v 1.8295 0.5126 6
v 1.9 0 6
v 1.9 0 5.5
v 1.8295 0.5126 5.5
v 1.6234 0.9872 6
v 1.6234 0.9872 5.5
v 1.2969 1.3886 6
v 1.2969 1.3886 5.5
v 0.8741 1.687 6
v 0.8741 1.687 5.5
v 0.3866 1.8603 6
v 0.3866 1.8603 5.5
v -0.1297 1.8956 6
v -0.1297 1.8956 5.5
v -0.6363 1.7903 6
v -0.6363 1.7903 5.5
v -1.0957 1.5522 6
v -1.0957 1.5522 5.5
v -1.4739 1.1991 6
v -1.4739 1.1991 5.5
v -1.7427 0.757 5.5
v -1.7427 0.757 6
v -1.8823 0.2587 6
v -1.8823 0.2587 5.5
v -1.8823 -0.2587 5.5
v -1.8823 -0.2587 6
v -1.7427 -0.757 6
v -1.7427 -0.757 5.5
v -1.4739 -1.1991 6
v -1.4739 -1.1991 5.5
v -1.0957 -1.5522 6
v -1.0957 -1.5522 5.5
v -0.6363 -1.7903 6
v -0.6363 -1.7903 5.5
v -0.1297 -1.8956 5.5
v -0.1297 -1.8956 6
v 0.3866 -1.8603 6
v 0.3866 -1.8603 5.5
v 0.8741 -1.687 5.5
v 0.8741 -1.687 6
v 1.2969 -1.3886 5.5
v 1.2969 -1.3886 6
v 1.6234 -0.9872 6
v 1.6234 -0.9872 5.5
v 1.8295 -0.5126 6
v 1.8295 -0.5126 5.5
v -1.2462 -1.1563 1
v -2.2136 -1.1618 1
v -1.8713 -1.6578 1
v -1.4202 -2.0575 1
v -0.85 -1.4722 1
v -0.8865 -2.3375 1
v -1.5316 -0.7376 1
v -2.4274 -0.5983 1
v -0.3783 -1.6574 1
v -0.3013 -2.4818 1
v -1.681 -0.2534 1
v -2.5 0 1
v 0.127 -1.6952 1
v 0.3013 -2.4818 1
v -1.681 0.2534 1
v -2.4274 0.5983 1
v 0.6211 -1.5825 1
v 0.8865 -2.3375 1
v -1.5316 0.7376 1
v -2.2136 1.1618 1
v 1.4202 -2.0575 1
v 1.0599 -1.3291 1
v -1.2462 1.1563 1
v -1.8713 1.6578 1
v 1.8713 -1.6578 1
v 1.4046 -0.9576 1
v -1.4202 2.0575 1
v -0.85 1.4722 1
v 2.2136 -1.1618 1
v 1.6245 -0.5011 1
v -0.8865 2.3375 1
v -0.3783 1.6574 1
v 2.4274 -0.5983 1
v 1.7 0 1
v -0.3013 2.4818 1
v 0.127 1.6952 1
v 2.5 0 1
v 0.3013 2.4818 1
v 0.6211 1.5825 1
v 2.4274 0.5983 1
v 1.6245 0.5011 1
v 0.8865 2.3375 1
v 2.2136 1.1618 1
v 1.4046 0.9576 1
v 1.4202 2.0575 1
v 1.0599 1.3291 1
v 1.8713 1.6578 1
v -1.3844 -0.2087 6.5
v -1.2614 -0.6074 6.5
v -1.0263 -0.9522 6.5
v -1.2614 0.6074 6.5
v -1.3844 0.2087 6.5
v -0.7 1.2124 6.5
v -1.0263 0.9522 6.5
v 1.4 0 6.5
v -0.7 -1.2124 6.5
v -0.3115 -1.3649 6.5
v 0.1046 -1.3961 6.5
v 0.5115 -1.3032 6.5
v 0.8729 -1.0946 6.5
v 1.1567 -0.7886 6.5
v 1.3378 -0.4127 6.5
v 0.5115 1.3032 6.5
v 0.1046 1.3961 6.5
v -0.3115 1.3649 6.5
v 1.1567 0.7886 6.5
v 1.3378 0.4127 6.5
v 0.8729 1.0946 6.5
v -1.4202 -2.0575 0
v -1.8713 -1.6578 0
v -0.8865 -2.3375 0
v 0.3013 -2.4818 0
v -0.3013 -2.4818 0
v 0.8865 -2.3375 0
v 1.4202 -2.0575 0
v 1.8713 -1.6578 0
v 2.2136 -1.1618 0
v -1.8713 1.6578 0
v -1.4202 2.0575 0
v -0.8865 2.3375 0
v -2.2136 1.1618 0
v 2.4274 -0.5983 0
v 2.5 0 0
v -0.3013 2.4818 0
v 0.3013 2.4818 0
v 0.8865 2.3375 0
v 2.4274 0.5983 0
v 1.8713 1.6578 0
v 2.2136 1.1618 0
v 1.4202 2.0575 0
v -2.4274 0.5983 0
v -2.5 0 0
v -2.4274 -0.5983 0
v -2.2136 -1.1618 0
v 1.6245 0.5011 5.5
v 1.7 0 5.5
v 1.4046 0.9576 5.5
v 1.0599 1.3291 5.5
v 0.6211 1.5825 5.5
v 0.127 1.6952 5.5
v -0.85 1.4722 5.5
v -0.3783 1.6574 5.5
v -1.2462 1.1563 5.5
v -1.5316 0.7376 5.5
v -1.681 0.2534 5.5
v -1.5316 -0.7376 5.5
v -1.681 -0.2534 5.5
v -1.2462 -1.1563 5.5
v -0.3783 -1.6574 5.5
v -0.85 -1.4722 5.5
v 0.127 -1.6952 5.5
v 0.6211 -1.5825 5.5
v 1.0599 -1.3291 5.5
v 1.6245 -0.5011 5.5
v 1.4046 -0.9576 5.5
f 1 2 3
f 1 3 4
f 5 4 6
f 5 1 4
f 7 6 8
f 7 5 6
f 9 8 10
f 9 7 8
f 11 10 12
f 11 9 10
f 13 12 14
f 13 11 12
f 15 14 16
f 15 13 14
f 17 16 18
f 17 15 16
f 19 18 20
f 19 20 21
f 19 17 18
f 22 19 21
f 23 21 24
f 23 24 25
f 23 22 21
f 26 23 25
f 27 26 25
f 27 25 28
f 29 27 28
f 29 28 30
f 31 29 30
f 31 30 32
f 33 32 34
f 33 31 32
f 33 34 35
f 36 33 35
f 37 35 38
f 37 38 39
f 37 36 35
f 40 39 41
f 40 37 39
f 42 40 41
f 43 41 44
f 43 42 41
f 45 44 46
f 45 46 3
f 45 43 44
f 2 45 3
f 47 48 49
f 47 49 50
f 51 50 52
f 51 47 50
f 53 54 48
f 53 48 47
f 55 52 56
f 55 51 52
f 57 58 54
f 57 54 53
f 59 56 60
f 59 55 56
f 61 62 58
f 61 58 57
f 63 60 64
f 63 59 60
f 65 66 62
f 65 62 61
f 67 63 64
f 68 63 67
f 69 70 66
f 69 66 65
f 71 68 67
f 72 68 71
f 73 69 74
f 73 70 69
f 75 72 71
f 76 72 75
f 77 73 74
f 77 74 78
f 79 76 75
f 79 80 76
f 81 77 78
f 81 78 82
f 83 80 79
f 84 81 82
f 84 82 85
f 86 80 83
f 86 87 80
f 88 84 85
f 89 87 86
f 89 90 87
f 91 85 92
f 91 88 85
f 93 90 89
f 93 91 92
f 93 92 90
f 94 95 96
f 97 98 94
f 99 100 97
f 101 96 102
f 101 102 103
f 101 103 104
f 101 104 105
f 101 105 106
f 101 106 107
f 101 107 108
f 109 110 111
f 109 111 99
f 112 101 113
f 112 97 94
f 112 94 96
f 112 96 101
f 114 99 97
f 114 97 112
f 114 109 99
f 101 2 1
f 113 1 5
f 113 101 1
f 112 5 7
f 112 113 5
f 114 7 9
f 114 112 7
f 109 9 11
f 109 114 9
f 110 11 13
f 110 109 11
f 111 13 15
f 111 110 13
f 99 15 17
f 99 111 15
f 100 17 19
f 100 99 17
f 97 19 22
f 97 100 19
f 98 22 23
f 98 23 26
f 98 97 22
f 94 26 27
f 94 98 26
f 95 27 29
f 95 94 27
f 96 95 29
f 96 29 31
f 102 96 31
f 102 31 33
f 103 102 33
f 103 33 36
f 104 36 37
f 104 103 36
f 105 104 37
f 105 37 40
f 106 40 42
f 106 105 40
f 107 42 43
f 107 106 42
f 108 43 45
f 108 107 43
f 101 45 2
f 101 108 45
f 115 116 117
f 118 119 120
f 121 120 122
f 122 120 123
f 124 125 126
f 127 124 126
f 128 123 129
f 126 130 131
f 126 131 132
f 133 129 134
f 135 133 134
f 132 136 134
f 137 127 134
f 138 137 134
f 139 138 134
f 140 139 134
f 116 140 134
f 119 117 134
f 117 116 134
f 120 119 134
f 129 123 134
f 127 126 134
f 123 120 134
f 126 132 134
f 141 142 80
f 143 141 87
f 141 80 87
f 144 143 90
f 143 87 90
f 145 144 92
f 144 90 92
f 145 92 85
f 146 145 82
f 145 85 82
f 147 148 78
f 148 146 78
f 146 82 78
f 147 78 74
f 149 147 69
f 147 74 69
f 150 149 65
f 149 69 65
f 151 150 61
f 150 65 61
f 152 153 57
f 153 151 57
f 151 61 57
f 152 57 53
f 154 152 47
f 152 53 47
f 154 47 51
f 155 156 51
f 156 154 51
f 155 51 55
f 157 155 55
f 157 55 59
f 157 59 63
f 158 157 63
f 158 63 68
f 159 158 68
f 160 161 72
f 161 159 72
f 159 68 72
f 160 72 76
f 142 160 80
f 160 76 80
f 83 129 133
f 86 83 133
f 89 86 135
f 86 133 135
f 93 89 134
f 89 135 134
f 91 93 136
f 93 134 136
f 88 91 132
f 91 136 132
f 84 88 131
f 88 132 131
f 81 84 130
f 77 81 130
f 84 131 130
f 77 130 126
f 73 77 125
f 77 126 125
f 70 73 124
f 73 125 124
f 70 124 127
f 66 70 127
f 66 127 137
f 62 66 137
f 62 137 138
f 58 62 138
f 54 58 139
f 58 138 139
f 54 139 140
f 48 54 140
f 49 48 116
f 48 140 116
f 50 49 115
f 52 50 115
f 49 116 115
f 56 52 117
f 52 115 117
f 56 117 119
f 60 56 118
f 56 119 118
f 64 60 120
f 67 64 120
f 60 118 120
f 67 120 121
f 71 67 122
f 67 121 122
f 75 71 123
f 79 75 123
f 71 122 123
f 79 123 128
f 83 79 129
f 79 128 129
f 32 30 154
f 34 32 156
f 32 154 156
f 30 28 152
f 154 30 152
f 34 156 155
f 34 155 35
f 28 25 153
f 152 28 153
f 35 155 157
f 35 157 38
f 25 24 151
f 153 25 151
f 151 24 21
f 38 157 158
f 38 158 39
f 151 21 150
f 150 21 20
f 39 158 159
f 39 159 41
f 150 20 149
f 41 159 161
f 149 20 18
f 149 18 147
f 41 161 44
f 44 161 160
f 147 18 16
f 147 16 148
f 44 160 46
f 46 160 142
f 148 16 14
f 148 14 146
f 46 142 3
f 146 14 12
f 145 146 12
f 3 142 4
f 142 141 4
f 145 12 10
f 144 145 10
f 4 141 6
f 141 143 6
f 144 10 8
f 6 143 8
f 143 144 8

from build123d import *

# Parameters (mm, degrees)
F0_R     = 2.5
F1_DEPTH = 1
F2_R     = 1.7
F3_DEPTH = 5.5
F4_R     = 1.9
F5_DEPTH = 1
F6_SIZE  = 0.5


with BuildPart() as f1:
    # F0 (on Top) → F1 (new body)
    with BuildSketch(Plane.XY):
        Circle(F0_R)
    extrude(amount=F1_DEPTH)

    # F2 (on face) → F3 (join)
    with BuildSketch(Plane.XY.offset(1)):
        Circle(F2_R)
    extrude(amount=F3_DEPTH)

    # F4 (on face) → F5 (join)
    with BuildSketch(Plane.XY.offset(6.5)):
        Circle(F4_R)
    extrude(amount=-F5_DEPTH)

    # F6
    f6_edges = [f1.edges().sort_by_distance(p)[0] for p in [
        (-1.9, 0, 6.5),
    ]]
    chamfer(f6_edges, length=F6_SIZE)


solid = f1.part
